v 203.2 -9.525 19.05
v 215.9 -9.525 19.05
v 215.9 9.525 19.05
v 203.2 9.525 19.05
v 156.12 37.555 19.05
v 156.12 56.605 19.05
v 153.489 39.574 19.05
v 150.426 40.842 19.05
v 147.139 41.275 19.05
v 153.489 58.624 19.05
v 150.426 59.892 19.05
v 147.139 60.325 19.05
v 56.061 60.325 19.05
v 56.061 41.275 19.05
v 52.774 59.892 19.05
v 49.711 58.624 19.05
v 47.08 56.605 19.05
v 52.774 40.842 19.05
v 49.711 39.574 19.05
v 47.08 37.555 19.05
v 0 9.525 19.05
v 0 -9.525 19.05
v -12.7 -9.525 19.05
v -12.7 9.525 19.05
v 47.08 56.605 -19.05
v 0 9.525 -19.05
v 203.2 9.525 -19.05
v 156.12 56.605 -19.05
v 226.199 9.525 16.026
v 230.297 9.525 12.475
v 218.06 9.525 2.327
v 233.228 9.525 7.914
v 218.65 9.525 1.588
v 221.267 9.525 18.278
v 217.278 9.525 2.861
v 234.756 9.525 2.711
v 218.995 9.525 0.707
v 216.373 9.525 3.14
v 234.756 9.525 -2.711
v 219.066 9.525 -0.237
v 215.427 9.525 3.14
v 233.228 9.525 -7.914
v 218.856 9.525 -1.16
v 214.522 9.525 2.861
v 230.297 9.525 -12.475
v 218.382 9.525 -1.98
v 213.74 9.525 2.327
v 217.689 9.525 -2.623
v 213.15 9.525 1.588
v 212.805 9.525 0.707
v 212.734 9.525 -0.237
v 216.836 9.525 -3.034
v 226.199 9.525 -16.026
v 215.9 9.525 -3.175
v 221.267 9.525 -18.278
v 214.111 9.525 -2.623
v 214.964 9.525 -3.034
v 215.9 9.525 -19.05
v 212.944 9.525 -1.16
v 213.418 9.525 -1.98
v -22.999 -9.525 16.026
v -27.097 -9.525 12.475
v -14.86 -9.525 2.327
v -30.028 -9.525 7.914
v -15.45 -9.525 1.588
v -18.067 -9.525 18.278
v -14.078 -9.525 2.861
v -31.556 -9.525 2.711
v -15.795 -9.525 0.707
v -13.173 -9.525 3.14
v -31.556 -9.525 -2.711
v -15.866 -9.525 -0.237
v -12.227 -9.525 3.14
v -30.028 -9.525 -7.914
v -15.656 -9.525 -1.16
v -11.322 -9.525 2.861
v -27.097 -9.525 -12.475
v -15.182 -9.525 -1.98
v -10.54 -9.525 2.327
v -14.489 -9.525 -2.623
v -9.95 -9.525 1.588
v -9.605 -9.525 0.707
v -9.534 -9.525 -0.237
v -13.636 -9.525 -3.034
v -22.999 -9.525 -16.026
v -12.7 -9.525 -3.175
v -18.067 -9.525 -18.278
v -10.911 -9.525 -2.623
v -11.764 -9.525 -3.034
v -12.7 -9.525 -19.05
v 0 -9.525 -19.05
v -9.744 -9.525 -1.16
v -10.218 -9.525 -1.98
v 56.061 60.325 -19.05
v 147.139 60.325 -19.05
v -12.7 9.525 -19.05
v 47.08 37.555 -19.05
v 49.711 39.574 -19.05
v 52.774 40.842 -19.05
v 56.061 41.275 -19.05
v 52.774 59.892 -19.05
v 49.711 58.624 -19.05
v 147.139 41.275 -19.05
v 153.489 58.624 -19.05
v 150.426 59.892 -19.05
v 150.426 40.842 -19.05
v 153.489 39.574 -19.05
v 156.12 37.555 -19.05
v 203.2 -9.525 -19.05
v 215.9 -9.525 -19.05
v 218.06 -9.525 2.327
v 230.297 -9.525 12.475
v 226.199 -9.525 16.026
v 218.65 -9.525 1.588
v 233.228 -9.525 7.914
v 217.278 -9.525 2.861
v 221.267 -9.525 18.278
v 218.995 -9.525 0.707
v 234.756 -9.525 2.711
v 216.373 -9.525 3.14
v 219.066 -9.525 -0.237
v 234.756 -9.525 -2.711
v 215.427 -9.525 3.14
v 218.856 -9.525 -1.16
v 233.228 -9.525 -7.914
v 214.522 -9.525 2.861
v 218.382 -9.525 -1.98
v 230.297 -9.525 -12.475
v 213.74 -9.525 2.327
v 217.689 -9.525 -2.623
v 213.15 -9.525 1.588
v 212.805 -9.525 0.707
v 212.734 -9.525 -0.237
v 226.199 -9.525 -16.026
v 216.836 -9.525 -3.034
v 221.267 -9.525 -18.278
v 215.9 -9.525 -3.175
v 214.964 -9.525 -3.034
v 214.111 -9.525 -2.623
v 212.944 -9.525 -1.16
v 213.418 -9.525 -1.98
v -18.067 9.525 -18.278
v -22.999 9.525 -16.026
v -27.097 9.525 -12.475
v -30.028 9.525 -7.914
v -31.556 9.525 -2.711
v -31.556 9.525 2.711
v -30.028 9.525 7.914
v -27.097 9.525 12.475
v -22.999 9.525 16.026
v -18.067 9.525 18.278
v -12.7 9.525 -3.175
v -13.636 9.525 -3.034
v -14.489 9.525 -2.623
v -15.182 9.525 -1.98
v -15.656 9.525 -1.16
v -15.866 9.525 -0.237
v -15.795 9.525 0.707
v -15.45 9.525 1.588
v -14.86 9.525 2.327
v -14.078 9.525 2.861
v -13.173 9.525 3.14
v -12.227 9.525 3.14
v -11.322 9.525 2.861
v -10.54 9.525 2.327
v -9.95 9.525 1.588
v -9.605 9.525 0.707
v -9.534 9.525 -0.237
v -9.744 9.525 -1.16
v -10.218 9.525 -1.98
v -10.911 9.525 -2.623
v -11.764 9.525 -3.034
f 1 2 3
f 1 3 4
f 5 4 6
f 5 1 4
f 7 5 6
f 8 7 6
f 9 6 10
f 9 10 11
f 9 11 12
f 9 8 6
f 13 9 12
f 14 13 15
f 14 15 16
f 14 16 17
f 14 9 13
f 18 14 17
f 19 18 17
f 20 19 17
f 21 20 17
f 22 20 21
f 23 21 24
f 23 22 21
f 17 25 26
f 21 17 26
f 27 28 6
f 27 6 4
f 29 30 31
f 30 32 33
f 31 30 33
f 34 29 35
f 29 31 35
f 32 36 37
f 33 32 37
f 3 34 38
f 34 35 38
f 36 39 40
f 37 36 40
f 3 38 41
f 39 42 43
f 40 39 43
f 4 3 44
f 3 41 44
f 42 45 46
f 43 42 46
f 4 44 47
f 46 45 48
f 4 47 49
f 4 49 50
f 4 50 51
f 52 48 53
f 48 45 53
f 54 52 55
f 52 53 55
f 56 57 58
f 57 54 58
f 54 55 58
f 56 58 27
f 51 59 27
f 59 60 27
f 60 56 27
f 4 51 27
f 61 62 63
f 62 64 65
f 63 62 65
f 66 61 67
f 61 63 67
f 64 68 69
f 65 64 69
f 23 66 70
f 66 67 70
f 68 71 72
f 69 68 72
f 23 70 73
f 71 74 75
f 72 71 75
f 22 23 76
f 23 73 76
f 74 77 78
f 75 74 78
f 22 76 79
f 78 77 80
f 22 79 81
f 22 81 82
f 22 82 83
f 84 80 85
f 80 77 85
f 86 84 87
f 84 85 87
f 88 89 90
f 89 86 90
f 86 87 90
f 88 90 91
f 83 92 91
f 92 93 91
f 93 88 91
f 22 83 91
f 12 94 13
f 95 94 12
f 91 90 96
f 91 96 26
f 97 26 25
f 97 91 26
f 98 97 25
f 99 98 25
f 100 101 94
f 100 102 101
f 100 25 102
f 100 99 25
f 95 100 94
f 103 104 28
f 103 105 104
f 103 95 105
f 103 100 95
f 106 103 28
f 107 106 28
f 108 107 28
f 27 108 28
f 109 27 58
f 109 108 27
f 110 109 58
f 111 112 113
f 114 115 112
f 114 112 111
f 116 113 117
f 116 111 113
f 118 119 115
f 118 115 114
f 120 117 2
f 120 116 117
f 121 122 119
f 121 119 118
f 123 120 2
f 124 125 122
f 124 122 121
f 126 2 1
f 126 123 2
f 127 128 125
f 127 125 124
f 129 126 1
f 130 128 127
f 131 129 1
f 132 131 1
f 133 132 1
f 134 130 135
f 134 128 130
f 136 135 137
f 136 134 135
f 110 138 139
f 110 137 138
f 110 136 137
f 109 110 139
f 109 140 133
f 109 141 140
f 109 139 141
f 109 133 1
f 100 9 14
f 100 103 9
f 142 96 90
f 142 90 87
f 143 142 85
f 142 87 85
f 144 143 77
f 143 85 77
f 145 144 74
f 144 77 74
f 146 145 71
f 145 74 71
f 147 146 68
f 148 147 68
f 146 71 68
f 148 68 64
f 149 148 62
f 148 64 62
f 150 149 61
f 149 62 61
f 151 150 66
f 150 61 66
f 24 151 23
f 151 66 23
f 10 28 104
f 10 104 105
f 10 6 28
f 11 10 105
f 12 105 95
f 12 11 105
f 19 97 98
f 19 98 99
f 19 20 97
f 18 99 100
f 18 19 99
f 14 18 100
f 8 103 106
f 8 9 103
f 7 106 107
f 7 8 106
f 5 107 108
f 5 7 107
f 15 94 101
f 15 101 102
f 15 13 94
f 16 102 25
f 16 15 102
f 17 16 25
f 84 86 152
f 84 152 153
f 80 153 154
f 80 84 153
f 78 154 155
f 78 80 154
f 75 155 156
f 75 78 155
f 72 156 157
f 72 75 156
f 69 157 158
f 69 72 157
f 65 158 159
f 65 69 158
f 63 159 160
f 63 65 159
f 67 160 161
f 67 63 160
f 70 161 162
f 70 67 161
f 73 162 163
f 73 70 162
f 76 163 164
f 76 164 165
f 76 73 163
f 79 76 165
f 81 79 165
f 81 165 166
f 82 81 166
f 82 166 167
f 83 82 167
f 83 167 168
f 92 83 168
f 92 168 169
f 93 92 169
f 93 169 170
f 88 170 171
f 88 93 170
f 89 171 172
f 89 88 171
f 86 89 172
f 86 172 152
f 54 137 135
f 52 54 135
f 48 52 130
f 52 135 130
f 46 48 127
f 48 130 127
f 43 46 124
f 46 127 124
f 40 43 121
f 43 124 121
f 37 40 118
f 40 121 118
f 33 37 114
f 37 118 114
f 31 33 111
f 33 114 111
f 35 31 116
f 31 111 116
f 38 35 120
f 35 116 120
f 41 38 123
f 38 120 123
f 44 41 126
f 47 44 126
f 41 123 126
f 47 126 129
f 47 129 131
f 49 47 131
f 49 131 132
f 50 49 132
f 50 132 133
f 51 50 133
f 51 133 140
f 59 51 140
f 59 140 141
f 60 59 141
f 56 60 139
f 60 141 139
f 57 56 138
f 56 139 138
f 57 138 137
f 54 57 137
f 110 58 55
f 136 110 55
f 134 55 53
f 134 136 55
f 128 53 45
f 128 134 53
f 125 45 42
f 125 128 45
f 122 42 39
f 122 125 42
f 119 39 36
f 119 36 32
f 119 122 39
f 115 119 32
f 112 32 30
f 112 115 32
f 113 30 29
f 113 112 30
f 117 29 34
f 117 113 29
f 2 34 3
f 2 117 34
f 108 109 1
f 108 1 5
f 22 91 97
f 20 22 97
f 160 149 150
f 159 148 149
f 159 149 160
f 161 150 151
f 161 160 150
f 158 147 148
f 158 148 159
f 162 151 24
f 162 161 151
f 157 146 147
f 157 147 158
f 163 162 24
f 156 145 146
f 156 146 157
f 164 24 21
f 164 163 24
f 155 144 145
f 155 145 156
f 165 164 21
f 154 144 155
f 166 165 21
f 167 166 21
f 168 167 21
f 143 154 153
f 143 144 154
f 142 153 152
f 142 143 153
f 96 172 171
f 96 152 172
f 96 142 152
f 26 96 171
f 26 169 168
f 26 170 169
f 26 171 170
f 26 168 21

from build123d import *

# Parameters (mm, degrees)
SWEEP1_START        = -19.05
SWEEP1_DEPTH        = 38.1
BOSS_EXTRUDE1_START = -9.525
SKETCH4_R           = 3.175
BOSS_EXTRUDE1_DEPTH = 19.05
FILLET1_R           = 12.7


# Read off the part's stored shape, not the designer's step: Sweep1
with BuildPart() as part:
    # Sweep1 outline → Sweep1 (new body)
    with BuildSketch(Plane.XY.offset(SWEEP1_START)):
        Polygon((101.6, 41.275), (101.6, 60.325), (50.8, 60.325), (0, 9.525), (0, -9.525), (50.8, 41.275), align=None)
    extrude(amount=SWEEP1_DEPTH)

    # Sketch4 → Boss-Extrude1 (add)
    with BuildSketch(Plane(origin=(0, 0, 0), x_dir=(1, 0, 0), z_dir=(0, 1, 0)).offset(BOSS_EXTRUDE1_START)):
        with BuildLine():
            Line((0, 19.05), (-12.7, 19.05))
            ThreePointArc((-12.7, 19.05), (-31.75, 0), (-12.7, -19.05))
            Line((-12.7, -19.05), (0, -19.05))
            Line((0, -19.05), (0, 19.05))
        make_face()
        with Locations(Location((-12.7, 0, 0), (0, 0, 90))):
            Circle(SKETCH4_R, mode=Mode.SUBTRACT)
    extrude(amount=BOSS_EXTRUDE1_DEPTH)

    # Mirror4: part across plane


with BuildPart() as part_1:
    add(part.part)
    add(part.part.mirror(Plane(origin=(101.6, 0, 0), x_dir=(0, 0, 1), z_dir=(1, 0, 0))))

    # Fillet1
    fillet1_edges = [part_1.edges().sort_by_distance(p)[0] for p in [
        (50.8, 60.325, 0),
        (50.8, 41.275, 0),
        (152.4, 60.325, 0),
        (152.4, 41.275, 0),
    ]]
    fillet(fillet1_edges, radius=FILLET1_R)


solid = part_1.part
